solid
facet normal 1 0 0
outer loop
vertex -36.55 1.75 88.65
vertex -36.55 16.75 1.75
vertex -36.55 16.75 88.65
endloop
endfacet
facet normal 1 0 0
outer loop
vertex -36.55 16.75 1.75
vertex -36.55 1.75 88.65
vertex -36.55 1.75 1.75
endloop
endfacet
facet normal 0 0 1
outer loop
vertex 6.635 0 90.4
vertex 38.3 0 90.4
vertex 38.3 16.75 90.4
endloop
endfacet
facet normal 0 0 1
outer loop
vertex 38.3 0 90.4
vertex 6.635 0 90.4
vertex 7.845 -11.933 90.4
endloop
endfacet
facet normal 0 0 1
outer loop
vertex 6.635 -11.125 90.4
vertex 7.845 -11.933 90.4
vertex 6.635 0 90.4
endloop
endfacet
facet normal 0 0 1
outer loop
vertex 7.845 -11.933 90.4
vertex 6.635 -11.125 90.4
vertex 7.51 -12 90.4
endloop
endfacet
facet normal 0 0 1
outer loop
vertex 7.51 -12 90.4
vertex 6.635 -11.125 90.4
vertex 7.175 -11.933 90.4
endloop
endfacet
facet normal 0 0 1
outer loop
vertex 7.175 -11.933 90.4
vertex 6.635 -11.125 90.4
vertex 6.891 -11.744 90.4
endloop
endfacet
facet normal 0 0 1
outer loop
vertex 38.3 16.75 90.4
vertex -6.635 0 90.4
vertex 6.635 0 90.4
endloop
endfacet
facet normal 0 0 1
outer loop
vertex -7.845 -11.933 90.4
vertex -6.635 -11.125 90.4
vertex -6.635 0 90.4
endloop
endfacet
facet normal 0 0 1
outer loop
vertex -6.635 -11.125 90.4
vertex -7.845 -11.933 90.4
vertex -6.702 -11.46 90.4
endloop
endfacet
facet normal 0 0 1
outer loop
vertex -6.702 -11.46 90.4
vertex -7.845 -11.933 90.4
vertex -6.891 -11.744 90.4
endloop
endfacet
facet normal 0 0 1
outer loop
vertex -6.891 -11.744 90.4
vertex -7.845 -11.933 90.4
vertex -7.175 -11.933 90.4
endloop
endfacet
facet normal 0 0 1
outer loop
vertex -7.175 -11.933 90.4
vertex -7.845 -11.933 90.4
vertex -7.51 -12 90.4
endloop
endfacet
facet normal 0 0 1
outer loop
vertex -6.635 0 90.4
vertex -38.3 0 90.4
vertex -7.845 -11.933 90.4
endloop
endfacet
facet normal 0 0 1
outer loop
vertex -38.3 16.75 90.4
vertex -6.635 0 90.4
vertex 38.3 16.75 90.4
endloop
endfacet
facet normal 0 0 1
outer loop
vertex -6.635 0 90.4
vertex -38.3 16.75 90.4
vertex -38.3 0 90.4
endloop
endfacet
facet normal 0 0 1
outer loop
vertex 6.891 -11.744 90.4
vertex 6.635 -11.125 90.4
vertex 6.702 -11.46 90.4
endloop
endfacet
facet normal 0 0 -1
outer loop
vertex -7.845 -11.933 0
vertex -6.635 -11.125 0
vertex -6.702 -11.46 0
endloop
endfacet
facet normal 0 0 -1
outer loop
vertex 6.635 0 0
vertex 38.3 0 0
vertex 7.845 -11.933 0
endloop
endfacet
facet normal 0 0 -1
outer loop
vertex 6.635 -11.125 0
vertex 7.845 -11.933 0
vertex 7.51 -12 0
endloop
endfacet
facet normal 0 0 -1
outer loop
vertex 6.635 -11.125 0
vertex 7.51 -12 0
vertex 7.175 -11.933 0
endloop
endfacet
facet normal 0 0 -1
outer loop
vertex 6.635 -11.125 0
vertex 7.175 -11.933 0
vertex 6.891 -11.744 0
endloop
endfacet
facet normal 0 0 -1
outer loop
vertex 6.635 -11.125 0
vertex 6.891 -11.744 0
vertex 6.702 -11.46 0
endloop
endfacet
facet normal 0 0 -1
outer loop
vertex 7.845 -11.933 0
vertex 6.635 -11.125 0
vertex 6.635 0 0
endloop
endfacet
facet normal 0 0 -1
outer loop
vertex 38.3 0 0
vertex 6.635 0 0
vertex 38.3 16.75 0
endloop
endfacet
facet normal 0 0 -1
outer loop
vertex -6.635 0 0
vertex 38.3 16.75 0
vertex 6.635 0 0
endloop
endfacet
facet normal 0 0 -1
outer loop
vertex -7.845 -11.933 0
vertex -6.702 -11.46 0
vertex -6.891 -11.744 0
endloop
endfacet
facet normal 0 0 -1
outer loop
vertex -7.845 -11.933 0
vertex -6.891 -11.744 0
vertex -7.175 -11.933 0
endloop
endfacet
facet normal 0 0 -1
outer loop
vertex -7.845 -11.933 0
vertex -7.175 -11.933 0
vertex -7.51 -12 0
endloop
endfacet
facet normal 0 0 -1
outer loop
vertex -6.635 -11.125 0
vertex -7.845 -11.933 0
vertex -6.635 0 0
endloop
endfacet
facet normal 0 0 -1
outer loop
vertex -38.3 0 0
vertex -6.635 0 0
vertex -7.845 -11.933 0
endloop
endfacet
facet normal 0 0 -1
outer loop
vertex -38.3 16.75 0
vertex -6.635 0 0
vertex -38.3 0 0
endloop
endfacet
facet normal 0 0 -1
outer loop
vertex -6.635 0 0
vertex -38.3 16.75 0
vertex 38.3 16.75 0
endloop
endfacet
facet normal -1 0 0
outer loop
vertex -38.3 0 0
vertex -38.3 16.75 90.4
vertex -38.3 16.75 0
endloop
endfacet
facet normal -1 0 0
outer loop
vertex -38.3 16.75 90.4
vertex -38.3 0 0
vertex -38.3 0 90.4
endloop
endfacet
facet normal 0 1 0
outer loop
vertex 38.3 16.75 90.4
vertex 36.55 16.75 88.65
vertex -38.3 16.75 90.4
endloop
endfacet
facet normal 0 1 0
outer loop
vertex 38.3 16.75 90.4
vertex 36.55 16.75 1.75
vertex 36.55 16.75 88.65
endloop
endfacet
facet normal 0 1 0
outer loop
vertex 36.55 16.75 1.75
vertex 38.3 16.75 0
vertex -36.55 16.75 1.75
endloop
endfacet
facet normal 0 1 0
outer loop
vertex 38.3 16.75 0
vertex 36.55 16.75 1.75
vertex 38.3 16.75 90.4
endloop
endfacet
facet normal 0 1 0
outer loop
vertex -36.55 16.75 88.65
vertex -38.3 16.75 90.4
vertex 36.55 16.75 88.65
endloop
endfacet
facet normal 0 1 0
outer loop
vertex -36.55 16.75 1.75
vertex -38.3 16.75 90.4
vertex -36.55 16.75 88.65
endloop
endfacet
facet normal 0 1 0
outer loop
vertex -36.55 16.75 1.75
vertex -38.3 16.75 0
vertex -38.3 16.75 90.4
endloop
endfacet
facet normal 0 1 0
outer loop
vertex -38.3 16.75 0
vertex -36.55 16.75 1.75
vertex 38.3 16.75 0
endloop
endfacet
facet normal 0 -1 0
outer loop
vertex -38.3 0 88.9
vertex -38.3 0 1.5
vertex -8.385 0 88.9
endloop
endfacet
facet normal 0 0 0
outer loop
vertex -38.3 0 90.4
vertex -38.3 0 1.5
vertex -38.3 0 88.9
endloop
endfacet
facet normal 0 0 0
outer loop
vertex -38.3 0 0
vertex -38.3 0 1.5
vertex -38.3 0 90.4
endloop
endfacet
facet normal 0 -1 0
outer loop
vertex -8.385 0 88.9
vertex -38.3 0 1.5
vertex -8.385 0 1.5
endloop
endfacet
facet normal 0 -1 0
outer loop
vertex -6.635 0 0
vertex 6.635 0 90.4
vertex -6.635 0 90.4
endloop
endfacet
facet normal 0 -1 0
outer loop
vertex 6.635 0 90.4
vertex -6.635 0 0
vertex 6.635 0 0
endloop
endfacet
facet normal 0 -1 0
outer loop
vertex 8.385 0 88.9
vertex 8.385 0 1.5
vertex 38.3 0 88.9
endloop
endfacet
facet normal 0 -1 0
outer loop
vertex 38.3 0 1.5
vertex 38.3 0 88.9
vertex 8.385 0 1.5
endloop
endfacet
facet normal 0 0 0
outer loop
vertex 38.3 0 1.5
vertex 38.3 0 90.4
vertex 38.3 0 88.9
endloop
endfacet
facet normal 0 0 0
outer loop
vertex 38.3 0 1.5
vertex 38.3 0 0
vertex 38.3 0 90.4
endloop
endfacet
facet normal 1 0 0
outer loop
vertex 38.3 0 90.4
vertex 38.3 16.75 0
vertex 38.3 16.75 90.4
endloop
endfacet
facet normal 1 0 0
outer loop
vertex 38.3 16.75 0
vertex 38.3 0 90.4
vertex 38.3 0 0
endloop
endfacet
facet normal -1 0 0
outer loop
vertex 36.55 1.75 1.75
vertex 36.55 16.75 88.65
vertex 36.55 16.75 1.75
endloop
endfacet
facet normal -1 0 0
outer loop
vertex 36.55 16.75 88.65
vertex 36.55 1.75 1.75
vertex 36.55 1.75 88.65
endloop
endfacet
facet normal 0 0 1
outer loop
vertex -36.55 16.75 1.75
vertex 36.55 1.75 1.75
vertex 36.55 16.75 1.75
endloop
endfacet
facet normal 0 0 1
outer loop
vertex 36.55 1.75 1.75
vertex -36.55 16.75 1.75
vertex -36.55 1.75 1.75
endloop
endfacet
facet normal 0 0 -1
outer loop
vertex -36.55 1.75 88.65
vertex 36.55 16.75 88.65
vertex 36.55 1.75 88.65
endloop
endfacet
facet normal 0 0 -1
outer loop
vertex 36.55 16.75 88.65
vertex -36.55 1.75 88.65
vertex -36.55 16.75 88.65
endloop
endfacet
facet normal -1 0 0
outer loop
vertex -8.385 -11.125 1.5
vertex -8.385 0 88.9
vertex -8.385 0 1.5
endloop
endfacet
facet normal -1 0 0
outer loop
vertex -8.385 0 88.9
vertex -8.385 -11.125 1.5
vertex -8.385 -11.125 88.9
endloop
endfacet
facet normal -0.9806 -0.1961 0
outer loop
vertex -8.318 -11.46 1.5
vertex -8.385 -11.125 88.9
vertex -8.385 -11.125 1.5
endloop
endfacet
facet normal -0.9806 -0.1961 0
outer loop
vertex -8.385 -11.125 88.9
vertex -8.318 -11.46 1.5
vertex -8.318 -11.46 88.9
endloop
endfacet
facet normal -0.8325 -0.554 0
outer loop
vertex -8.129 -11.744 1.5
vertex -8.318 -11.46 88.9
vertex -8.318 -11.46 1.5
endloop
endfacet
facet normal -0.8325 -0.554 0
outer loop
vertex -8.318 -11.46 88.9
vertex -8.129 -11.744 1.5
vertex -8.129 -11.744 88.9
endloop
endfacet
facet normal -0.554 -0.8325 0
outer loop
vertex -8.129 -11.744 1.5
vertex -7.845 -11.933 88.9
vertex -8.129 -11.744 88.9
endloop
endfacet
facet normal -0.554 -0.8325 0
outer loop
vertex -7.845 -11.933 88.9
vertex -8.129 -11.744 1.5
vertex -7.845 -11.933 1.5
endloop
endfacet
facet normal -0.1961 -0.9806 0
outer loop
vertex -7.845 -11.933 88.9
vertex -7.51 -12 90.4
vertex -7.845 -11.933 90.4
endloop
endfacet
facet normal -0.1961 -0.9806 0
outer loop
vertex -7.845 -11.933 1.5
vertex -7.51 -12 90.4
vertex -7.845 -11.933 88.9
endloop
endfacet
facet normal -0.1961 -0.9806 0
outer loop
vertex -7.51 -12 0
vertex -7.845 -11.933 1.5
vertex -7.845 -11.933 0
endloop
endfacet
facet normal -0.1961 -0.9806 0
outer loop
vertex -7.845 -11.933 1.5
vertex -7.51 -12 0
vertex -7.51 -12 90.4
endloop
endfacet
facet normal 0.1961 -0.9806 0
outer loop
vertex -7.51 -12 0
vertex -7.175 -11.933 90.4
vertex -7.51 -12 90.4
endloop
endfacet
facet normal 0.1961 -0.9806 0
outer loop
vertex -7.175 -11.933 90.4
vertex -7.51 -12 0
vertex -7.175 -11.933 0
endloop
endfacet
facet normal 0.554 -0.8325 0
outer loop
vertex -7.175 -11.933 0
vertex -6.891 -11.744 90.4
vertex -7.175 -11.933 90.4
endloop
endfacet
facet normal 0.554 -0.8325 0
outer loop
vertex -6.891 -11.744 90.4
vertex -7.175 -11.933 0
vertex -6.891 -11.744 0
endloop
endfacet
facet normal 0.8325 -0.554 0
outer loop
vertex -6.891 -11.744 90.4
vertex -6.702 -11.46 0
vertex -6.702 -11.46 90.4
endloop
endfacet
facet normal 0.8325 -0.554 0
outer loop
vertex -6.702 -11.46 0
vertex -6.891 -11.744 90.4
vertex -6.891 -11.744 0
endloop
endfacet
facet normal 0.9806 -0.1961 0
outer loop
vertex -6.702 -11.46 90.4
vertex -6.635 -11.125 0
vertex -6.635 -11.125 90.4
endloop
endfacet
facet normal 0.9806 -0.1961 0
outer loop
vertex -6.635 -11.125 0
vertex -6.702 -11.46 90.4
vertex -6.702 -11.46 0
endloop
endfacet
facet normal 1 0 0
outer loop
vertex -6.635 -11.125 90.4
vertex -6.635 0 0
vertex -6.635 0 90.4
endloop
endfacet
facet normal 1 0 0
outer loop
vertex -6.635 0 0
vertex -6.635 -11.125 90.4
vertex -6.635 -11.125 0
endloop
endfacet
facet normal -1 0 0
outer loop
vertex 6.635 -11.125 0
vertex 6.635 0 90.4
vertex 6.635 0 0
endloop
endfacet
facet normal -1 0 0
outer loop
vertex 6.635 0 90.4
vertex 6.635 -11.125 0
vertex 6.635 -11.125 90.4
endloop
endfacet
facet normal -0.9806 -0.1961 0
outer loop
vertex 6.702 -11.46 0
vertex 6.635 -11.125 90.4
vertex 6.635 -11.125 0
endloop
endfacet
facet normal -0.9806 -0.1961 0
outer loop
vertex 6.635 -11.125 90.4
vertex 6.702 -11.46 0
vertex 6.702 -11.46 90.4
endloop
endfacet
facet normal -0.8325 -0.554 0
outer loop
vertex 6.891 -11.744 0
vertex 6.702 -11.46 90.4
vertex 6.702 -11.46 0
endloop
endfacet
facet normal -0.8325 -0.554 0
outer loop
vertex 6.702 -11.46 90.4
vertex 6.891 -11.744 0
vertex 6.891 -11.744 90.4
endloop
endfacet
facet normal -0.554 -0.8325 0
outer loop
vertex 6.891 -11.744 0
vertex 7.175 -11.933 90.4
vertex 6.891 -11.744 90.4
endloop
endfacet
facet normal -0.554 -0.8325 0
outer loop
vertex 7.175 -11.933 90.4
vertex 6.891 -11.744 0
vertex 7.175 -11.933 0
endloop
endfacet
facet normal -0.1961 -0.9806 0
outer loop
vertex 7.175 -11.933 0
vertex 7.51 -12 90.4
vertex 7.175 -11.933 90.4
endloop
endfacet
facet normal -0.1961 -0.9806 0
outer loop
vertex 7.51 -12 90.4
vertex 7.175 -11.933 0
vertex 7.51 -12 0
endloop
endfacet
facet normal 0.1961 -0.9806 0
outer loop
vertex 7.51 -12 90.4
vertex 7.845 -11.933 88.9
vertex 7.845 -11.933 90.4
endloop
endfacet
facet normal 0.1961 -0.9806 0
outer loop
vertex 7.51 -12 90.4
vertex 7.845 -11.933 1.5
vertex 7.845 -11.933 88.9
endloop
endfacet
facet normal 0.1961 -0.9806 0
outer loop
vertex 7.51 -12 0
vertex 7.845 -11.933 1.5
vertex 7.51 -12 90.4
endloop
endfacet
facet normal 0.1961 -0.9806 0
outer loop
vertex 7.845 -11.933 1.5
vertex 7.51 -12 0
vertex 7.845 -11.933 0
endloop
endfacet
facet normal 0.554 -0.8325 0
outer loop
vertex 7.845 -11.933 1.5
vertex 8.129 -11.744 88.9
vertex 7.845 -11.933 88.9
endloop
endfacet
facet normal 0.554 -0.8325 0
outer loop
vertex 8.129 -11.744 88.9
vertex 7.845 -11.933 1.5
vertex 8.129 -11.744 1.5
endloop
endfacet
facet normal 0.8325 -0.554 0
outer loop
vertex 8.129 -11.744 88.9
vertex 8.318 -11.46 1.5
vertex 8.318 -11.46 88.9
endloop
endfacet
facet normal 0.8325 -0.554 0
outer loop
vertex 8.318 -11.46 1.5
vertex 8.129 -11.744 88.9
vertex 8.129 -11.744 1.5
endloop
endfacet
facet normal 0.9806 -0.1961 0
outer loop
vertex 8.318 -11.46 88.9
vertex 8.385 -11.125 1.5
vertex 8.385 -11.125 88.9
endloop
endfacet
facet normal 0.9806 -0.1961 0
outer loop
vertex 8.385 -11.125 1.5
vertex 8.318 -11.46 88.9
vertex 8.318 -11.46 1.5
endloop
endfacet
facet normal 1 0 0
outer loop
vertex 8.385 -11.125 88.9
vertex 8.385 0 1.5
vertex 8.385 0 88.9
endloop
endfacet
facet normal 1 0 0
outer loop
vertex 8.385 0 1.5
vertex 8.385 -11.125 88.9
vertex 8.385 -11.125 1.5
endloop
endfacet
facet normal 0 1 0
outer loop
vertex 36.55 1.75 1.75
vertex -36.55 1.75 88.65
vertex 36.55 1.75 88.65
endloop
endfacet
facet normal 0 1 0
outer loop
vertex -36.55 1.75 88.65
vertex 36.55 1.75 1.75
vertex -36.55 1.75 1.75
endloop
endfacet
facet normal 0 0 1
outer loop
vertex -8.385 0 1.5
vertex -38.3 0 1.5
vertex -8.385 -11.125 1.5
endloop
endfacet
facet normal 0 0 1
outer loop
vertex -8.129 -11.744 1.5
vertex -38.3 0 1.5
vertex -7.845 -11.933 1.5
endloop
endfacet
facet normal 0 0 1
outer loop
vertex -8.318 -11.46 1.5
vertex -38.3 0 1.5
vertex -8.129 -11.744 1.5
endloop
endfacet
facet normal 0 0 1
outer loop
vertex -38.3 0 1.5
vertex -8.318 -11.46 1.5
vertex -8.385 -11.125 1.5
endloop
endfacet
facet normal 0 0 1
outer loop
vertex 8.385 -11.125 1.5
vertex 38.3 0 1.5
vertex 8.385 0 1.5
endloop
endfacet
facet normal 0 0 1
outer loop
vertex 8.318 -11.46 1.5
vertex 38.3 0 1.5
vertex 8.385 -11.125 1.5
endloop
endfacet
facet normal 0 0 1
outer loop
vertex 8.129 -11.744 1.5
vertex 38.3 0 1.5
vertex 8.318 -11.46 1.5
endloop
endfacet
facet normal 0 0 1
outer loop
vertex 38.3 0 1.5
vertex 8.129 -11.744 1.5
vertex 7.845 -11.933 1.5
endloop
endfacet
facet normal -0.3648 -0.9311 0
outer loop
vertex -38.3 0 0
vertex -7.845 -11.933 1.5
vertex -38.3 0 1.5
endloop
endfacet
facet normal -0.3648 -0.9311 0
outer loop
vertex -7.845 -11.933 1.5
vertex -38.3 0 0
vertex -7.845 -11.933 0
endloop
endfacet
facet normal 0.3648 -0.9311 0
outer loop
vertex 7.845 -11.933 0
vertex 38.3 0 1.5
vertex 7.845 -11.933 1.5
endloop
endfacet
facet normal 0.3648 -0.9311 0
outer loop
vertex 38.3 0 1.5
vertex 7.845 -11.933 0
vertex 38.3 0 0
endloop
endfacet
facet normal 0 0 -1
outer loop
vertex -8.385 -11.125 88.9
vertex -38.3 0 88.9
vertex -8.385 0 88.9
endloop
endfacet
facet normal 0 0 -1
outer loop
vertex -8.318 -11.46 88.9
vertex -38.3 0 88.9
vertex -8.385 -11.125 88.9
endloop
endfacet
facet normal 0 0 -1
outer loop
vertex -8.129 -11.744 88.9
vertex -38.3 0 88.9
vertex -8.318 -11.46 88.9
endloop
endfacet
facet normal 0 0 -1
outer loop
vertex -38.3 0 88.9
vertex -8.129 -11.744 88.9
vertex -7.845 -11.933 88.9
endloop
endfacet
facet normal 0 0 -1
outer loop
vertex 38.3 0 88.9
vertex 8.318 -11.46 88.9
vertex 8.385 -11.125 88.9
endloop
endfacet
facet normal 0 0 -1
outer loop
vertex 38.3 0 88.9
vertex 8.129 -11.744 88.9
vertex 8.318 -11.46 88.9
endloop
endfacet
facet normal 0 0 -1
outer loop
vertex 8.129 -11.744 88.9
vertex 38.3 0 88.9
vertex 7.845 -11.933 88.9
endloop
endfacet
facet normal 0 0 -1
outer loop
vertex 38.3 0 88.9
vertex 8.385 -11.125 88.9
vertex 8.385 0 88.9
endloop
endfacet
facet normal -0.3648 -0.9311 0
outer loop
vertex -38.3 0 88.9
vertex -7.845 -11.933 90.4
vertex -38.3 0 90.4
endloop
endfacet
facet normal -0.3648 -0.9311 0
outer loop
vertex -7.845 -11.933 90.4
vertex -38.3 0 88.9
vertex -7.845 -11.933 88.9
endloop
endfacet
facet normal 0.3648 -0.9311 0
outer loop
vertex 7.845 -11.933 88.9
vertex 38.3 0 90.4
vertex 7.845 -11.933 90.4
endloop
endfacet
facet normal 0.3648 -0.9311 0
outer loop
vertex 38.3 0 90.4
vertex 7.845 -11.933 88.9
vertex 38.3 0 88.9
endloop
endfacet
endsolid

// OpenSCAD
tvTolerance = .07;
tvThickness = 13.2;
bezelHeight = 12;
baseWidth = 86.7;
baseDepth = 72.9;
baseTolerance = .2;
wallHeight = 15;
wallThickness = 1.75;
braceThickness = 1.5;

w1 = baseDepth+baseTolerance+2*wallThickness;
w2 = tvThickness+tvTolerance;

module holderWall() {
    hull() {
        square([wallThickness,wallThickness]);
        translate([wallThickness/2,-bezelHeight+wallThickness/2]) circle(d=wallThickness,$fn=16);
    }
}

module braces() {
    hull() {
        translate([-w1/2,0]) square([w1/2-w2/2,wallThickness]);
        translate([-w2/2-wallThickness,0]) holderWall();
    }
    mirror([1,0]) hull() {
        translate([-w1/2,0]) square([w1/2-w2/2,wallThickness]);
        translate([-w2/2-wallThickness,0]) holderWall();
    }
}

module profile() {
    translate([-w1/2,0]) square([w1,wallThickness]);
    translate([-w2/2-wallThickness,0]) holderWall();
    translate([w2/2,0]) holderWall();
//    brace();
}

w3 = baseWidth + baseTolerance;
module main() {
    linear_extrude(height=w3+2*wallThickness) profile();
    linear_extrude(height=braceThickness) braces();
    translate([0,0,w3+2*wallThickness-braceThickness]) linear_extrude(height=braceThickness) braces();
    for (x=[-w1/2,w1/2-wallThickness]) translate([x,0,0]) cube([wallThickness,wallHeight+wallThickness,w3+2*wallThickness]);
    for (z=[0,w3+wallThickness]) translate([-w1/2,0,z]) cube([w1,wallHeight+wallThickness,wallThickness]);

}
main();
